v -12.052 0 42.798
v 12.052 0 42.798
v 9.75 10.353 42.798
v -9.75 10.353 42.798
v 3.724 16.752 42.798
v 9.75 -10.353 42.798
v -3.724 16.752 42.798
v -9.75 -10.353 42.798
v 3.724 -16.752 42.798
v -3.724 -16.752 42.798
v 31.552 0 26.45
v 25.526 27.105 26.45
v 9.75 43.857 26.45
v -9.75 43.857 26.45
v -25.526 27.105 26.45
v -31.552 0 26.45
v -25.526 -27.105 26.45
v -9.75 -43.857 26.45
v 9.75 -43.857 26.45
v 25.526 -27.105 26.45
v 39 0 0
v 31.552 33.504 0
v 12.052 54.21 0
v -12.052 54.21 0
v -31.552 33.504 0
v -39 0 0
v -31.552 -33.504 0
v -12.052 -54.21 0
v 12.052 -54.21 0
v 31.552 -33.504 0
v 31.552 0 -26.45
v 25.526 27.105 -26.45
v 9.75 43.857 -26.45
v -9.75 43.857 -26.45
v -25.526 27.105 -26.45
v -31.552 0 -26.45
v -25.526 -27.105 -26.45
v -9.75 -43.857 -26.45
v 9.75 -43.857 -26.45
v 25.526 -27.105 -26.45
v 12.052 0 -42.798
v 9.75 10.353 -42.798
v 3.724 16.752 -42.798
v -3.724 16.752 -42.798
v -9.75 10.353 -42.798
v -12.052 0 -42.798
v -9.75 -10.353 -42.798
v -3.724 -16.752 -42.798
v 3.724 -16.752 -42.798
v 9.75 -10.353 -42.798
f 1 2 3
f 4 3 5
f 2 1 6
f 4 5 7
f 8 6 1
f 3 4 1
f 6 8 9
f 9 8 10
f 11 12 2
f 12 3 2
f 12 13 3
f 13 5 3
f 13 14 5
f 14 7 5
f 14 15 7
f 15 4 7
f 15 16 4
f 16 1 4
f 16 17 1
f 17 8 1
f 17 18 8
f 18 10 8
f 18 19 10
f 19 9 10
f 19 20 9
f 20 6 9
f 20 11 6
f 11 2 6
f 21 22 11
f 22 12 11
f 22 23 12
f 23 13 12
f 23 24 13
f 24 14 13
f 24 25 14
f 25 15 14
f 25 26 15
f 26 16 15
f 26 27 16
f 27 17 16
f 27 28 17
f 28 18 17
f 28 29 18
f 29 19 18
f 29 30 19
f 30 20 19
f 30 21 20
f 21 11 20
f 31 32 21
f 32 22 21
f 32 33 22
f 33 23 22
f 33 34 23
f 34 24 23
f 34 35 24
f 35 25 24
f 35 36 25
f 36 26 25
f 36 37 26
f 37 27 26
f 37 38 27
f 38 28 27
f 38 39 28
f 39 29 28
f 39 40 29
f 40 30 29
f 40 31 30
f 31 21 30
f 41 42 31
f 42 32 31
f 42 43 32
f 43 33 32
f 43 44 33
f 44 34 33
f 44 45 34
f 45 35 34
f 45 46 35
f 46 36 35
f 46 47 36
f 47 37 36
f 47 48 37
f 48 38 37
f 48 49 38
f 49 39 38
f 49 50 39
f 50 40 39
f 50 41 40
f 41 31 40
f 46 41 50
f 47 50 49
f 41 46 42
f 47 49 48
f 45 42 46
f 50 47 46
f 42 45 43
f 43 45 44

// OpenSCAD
// Generated by SolidPython 1.0.1 on 2020-07-29 00:46:51


scale(v = [13, 19, 15]) {
	sphere(r = 3);
}
/***********************************************
*********      SolidPython code:      **********
************************************************
 
# import packages: SolidPython
from solid import *
from solid.utils import *
from itertools import chain, combinations, permutations


class Resize:

    def __init__(self, scad_file):
        self.scad_file = scad_file
        #self.scad_file = import_scad(scad_file)
        # cone/cylinder param:
        self.r1 = 0
        self.r2 = 0
        self.h = 0
        # rectangular prism param:
        self.w = 0
        self.l = 0
        # ellipse param:
        self.r = 0

    # import OpenScad code (file name corresponds to shape)


    # classify shape + parameters
    def assign(self, param1, param2, param3):
        if self.scad_file == 'cone.scad':
            self.r1 = param1
            self.r2 = param2
            self.h = param3
        elif self.scad_file == 'cylinder.scad':
            self.r1 = param1
            self.r2 = param2
            self.h = param3
        elif self.scad_file == 'rectangularPrism.scad':
            self.h = param1
            self.l = param2
            self.w = param3
        else:
            self.r = param1
            self.h = param2

    # resize parameters
    def iterate(self):
        x = range(3, 20, 2)
        i = 1
        if self.scad_file == 'cone.scad':
            tempList = list(permutations(x, 2))
            for temp in tempList:
                param1 = temp[0]
                param2 = temp[1]
                filepath = 'produced_scad_files/' + 'cone' + str(param1) + '_' + str(param2) + '_' + '.scad'
                scad_render_to_file(cylinder(h=param1, r1=param2, r2=0), filepath)

        elif self.scad_file == 'cylinder.scad':
            tempList = list(permutations(x, 3))
            for temp in tempList:
                param1 = temp[0]
                param2 = temp[1]
                filepath = 'produced_scad_files/' + 'cylinder' + str(param1) + '_' + str(param2) + '_' + '.scad'
                scad_render_to_file(cylinder(h=param1, r1=param2, r2=param2), filepath)

        elif self.scad_file == 'rectangularPrism.scad':
            tempList = list(permutations(x, 3))
            for temp in tempList:
                param1 = temp[0]
                param2 = temp[1]
                param3 = temp[2]
                filepath = 'produced_scad_files/' + 'rectangularPrism' + str(param1) + '_' + str(param2) + '_' + str(
                    param3) + '.scad'
                scad_render_to_file(cube(size=(param1, param2, param3)), filepath)

        elif self.scad_file == 'ellipse.scad':
            tempList = list(permutations(x, 4))
            for temp in tempList:
                param1 = temp[0]
                param2 = temp[1]
                param3 = temp[2]
                param4 = temp[3]
                filepath = 'produced_scad_files/' + 'ellipse' + str(param1) + '_' + str(param2) + '_' + str(param3) + '_' + str(param4) + '.scad'
                scad_render_to_file(scale([param1, param2, param3])(sphere(r=param4)), filepath)

    def render_to_scadfile(self):
        scad_render_to_file(scad, 'example.scad') 
 
************************************************/
